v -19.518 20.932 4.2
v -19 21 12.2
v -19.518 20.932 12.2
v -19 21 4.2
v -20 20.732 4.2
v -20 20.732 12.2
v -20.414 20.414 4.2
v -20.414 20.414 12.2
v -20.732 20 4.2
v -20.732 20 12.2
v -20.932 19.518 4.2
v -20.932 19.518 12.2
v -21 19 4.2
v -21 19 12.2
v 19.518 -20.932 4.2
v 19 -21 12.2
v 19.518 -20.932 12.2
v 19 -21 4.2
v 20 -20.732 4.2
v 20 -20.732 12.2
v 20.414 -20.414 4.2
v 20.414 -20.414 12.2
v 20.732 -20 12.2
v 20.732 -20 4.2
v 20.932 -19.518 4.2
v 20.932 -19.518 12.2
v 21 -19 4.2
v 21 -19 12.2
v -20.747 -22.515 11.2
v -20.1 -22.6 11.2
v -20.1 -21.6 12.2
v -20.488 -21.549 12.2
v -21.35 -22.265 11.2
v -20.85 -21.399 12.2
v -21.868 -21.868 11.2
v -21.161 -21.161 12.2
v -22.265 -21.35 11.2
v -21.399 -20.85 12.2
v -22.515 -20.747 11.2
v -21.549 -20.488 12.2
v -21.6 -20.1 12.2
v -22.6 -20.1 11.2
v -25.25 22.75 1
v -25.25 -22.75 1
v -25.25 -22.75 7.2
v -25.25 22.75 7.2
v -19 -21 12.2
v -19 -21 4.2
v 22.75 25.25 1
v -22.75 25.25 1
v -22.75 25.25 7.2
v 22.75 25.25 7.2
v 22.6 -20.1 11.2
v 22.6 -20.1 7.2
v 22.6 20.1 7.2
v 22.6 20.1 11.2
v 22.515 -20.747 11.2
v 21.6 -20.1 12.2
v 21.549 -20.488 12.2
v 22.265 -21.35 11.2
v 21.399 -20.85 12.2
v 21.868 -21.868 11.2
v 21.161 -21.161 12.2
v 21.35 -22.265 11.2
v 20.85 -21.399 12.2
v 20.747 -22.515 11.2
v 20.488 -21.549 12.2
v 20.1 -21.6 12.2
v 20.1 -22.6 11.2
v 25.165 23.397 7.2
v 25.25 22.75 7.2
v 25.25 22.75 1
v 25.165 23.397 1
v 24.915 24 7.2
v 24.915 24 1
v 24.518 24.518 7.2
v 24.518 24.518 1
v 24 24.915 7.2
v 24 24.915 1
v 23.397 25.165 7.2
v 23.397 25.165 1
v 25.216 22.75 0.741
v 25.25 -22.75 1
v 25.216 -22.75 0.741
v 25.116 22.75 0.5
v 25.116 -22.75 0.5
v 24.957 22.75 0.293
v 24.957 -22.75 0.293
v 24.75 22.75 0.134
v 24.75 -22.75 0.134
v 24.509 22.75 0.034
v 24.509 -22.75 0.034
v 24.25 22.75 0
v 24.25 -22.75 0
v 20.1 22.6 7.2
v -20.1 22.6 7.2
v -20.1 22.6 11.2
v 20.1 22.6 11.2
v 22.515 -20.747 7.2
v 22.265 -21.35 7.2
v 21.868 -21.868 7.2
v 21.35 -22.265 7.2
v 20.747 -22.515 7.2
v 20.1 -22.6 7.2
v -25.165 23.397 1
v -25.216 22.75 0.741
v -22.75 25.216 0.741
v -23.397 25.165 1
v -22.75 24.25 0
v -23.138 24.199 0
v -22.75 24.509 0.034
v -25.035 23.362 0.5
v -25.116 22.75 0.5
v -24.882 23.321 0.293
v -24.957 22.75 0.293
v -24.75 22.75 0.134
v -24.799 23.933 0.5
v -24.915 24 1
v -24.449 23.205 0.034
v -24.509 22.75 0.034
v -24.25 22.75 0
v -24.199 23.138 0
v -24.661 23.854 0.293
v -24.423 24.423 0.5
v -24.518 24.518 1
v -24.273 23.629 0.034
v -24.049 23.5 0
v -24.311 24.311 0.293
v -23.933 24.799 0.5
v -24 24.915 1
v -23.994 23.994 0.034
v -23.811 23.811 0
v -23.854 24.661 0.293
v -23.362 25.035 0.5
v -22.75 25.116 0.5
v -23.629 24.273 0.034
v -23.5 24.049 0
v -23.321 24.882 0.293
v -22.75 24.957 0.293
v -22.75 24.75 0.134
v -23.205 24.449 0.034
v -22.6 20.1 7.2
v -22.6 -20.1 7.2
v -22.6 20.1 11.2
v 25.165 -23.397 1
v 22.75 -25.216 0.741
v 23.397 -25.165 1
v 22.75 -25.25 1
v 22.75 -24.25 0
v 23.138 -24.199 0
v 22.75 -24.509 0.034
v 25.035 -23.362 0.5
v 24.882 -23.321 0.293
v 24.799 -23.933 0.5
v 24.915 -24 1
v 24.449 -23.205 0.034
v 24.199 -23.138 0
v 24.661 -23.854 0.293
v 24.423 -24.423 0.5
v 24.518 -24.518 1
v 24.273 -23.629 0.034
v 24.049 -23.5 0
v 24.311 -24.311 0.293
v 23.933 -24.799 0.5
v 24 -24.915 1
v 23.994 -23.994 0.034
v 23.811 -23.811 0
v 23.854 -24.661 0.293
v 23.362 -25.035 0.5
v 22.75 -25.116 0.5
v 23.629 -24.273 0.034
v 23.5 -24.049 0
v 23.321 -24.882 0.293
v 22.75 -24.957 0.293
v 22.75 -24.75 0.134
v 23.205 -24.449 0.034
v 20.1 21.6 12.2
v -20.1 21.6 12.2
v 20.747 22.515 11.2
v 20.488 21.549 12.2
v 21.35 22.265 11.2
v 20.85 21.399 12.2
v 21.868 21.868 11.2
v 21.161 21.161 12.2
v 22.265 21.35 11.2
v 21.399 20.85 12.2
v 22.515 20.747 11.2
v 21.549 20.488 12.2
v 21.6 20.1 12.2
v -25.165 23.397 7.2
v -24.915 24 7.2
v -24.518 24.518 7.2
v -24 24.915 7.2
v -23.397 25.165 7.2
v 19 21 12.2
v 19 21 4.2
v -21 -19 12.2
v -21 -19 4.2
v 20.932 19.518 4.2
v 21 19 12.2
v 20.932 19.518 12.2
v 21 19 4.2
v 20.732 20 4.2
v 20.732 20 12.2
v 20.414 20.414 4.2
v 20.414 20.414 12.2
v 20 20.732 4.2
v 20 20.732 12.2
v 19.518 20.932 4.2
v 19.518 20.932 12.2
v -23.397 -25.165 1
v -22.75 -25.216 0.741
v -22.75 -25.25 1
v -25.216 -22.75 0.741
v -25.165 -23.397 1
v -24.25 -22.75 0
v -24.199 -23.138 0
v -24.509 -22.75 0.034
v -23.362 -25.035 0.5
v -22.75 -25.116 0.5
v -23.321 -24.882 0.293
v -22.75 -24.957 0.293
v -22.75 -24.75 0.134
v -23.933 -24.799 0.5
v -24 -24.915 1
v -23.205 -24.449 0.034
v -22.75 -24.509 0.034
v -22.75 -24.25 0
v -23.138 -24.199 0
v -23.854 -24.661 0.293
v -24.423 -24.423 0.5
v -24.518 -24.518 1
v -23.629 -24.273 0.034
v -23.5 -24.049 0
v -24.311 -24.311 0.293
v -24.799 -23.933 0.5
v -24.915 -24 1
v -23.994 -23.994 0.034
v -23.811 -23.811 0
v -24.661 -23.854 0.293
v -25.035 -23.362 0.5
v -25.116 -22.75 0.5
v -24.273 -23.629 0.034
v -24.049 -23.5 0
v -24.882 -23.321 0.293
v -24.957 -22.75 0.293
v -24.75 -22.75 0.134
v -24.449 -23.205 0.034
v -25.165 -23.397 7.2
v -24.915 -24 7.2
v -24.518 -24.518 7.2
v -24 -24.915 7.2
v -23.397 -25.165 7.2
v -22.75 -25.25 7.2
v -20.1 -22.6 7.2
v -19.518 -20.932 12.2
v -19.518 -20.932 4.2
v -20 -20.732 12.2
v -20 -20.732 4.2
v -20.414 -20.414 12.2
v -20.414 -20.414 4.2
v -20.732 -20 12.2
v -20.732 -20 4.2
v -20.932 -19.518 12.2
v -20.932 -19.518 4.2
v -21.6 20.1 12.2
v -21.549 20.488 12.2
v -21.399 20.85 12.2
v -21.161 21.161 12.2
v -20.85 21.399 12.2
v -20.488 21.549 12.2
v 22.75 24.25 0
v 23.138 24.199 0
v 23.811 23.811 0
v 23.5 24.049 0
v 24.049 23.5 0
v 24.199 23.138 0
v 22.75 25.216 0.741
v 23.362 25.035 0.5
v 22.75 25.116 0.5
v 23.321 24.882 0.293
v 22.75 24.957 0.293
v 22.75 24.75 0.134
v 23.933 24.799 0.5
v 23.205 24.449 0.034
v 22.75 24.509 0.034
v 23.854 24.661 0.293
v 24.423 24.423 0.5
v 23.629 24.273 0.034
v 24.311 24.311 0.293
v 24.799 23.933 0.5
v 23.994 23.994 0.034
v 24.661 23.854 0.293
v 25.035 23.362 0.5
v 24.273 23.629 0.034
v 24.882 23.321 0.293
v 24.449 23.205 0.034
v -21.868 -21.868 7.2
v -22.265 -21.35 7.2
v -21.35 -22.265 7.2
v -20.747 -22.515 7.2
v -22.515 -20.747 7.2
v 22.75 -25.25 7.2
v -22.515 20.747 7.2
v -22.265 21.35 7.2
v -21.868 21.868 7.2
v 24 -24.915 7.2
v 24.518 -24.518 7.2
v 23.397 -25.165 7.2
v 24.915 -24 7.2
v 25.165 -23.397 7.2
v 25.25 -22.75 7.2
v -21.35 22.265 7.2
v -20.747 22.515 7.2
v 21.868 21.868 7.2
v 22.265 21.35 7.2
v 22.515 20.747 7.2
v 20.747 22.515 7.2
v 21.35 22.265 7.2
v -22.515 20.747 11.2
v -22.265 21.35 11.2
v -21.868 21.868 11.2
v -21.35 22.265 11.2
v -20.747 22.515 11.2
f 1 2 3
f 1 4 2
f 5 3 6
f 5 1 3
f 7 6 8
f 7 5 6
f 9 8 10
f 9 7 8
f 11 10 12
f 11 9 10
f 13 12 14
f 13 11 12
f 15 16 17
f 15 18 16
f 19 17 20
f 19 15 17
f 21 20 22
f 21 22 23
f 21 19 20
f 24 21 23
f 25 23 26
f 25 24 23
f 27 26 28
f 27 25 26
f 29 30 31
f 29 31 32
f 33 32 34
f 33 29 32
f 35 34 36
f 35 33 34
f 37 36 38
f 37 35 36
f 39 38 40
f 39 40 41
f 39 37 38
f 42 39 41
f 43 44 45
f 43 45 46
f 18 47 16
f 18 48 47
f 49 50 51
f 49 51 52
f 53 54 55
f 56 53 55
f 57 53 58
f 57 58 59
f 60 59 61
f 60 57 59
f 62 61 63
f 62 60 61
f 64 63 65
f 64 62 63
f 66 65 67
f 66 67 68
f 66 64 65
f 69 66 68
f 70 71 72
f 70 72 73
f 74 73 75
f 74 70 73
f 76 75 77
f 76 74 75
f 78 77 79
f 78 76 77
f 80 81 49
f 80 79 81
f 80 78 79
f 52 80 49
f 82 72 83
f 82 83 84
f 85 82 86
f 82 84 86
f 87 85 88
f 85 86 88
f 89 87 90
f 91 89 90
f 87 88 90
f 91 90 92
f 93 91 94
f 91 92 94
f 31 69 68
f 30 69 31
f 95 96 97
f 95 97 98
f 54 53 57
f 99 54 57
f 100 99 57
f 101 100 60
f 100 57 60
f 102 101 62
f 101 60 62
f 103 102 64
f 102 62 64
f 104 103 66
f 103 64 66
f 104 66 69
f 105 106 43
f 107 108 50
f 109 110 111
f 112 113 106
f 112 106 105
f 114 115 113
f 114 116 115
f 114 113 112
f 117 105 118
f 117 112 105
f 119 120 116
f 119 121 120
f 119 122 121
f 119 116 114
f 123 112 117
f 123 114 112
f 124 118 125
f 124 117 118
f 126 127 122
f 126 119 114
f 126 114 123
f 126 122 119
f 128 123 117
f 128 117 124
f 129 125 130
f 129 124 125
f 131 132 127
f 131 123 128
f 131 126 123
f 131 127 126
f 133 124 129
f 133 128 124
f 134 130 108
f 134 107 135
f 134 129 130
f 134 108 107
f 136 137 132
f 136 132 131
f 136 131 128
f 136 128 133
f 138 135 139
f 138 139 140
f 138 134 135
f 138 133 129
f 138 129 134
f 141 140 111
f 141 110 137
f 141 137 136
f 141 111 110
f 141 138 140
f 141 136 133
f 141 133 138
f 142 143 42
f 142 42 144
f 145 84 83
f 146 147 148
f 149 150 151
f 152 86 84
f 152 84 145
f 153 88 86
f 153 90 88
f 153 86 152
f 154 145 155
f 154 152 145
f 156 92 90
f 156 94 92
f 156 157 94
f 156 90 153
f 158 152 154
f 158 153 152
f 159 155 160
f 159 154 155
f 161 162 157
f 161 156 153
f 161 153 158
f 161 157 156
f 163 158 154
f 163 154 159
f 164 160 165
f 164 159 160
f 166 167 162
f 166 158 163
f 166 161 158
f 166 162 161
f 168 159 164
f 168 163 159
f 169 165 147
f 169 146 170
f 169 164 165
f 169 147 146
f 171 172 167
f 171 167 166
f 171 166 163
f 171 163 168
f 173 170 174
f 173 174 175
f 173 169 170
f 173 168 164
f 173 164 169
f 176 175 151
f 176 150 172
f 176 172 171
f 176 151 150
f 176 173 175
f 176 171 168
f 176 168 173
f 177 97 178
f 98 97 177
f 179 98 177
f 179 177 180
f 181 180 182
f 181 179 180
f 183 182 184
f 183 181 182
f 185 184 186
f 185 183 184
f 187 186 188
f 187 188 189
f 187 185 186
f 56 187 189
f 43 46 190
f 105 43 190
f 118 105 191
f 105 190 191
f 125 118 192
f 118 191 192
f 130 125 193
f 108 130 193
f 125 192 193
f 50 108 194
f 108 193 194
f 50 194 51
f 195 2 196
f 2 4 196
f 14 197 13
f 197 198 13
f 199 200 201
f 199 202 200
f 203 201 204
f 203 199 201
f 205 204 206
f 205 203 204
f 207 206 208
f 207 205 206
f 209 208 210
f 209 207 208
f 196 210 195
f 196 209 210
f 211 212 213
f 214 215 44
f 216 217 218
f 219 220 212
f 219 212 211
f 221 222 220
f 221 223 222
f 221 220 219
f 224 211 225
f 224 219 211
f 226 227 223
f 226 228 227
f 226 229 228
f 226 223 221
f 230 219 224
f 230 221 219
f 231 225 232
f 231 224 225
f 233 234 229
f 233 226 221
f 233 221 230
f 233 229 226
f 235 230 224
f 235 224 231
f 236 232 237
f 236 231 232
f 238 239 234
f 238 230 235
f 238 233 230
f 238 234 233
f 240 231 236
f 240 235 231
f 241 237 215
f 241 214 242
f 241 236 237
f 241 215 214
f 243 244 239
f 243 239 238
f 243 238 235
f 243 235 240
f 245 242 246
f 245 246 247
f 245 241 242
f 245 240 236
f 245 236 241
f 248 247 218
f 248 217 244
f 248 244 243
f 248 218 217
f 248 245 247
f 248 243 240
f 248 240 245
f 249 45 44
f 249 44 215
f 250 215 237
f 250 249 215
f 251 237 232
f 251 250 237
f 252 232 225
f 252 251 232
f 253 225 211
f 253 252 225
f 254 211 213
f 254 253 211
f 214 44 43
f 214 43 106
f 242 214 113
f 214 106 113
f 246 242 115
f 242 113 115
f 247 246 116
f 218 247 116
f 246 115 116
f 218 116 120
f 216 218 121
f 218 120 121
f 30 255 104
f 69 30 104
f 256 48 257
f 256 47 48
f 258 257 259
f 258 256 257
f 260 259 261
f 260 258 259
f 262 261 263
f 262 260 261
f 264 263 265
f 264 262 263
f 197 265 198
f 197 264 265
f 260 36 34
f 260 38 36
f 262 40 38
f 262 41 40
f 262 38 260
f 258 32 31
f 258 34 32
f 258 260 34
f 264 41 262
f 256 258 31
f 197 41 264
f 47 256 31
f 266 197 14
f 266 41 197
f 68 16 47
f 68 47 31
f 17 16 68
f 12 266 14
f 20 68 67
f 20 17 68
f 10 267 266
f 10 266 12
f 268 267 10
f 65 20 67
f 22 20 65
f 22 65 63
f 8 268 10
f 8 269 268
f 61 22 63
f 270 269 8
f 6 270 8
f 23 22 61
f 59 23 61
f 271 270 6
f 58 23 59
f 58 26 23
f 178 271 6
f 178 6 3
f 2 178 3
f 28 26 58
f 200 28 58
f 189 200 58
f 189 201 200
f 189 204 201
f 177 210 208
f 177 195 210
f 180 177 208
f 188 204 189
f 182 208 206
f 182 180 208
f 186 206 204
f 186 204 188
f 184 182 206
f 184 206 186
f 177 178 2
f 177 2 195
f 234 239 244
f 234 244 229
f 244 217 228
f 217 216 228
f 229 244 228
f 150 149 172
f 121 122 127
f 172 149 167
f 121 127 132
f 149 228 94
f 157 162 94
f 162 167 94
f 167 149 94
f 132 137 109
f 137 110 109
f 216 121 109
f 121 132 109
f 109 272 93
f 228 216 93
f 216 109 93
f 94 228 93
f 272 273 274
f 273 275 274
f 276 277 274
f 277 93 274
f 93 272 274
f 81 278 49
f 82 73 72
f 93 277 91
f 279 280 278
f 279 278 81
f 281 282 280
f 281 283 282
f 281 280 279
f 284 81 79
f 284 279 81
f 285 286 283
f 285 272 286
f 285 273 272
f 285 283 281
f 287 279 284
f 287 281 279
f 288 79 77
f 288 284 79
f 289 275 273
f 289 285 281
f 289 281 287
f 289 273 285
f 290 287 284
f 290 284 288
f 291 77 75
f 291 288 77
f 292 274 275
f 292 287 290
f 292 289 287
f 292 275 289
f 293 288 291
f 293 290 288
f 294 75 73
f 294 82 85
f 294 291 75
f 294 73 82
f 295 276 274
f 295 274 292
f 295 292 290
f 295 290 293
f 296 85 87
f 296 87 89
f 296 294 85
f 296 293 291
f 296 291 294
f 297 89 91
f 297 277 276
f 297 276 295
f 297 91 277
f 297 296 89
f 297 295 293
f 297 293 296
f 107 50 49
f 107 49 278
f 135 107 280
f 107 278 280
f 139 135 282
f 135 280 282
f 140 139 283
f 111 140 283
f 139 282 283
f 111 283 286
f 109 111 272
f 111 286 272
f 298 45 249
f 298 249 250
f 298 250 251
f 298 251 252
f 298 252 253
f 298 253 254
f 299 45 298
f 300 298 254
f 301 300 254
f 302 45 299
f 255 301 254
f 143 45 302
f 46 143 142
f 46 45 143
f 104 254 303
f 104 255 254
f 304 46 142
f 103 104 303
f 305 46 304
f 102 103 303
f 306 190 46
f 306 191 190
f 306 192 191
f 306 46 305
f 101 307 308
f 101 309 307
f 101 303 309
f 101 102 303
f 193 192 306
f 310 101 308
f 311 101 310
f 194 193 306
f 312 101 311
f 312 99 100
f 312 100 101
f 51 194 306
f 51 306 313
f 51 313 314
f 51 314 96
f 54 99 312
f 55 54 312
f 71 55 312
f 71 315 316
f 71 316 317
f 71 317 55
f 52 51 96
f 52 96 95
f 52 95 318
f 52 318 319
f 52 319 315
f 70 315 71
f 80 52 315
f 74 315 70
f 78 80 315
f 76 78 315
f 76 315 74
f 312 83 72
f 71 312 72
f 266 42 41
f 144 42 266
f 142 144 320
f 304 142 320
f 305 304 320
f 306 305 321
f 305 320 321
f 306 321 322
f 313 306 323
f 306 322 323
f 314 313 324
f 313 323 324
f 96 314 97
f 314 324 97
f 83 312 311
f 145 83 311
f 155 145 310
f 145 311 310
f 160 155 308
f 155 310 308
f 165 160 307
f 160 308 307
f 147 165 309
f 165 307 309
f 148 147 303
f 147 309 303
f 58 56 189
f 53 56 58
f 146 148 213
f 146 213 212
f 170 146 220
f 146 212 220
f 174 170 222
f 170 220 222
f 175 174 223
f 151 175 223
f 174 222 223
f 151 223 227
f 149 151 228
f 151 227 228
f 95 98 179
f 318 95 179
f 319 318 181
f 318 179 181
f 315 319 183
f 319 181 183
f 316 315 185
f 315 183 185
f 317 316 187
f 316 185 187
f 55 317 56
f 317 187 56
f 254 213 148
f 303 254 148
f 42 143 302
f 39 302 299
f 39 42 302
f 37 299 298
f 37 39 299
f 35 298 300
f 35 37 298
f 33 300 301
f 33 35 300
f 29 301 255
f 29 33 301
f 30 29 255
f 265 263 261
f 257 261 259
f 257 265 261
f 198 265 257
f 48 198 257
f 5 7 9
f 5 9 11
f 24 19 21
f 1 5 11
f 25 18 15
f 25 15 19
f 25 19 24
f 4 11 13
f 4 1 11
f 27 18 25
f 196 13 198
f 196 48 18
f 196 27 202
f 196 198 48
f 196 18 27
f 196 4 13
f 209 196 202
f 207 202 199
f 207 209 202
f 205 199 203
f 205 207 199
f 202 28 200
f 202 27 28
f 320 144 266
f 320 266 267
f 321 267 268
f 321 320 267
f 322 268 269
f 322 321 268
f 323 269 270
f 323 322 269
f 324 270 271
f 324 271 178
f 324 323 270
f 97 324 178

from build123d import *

# Parameters (mm, degrees)
F0_W          = 50.5
F0_H          = 50.5
F1_DEPTH      = 7.2
F2_W          = 45.2
F2_H          = 45.2
F3_DEPTH      = 5
F4_W          = 42
F4_H          = 42
F5_DEPTH      = 5
F5_DEPTH_BACK = 3
F6_R          = 2.5
F7_R          = 2
F8_SIZE       = 1
F9_R          = 1


with BuildPart() as f1:
    # F0 (on Top) → F1 (new body)
    with BuildSketch(Plane.XY):
        Rectangle(F0_W, F0_H)
    extrude(amount=F1_DEPTH)

    # F2 (on face) → F3 (join)
    with BuildSketch(Plane.XY.offset(7.2)):
        Rectangle(F2_W, F2_H)
    extrude(amount=F3_DEPTH)

    # F4 (on face) → F5 (cut, two sides)
    with BuildSketch(Plane.XY.offset(7.2)) as f5_sk:
        Rectangle(F4_W, F4_H)
    extrude(amount=F5_DEPTH, mode=Mode.SUBTRACT)
    extrude(f5_sk.sketch, amount=-F5_DEPTH_BACK, mode=Mode.SUBTRACT)

    # F6
    f6_edges = [f1.edges().sort_by_distance(p)[0] for p in [
        (-25.25, 25.25, 3.6),
        (-25.25, -25.25, 3.6),
        (25.25, -25.25, 3.6),
        (25.25, 25.25, 3.6),
        (-22.6, 22.6, 9.7),
        (-22.6, -22.6, 9.7),
        (22.6, -22.6, 9.7),
        (22.6, 22.6, 9.7),
    ]]
    fillet(f6_edges, radius=F6_R)

    # F7
    f7_edges = [f1.edges().sort_by_distance(p)[0] for p in [
        (-21, 21, 8.2),
        (21, 21, 8.2),
        (21, -21, 8.2),
        (-21, -21, 8.2),
    ]]
    fillet(f7_edges, radius=F7_R)

    # F8
    f8_edges = [f1.edges().sort_by_distance(p)[0] for p in [
        (-22.6, 0, 12.2),
    ]]
    chamfer(f8_edges, length=F8_SIZE)

    # F9
    f9_edges = [f1.edges().sort_by_distance(p)[0] for p in [
        (0, 25.25, 0),
    ]]
    fillet(f9_edges, radius=F9_R)


solid = f1.part
